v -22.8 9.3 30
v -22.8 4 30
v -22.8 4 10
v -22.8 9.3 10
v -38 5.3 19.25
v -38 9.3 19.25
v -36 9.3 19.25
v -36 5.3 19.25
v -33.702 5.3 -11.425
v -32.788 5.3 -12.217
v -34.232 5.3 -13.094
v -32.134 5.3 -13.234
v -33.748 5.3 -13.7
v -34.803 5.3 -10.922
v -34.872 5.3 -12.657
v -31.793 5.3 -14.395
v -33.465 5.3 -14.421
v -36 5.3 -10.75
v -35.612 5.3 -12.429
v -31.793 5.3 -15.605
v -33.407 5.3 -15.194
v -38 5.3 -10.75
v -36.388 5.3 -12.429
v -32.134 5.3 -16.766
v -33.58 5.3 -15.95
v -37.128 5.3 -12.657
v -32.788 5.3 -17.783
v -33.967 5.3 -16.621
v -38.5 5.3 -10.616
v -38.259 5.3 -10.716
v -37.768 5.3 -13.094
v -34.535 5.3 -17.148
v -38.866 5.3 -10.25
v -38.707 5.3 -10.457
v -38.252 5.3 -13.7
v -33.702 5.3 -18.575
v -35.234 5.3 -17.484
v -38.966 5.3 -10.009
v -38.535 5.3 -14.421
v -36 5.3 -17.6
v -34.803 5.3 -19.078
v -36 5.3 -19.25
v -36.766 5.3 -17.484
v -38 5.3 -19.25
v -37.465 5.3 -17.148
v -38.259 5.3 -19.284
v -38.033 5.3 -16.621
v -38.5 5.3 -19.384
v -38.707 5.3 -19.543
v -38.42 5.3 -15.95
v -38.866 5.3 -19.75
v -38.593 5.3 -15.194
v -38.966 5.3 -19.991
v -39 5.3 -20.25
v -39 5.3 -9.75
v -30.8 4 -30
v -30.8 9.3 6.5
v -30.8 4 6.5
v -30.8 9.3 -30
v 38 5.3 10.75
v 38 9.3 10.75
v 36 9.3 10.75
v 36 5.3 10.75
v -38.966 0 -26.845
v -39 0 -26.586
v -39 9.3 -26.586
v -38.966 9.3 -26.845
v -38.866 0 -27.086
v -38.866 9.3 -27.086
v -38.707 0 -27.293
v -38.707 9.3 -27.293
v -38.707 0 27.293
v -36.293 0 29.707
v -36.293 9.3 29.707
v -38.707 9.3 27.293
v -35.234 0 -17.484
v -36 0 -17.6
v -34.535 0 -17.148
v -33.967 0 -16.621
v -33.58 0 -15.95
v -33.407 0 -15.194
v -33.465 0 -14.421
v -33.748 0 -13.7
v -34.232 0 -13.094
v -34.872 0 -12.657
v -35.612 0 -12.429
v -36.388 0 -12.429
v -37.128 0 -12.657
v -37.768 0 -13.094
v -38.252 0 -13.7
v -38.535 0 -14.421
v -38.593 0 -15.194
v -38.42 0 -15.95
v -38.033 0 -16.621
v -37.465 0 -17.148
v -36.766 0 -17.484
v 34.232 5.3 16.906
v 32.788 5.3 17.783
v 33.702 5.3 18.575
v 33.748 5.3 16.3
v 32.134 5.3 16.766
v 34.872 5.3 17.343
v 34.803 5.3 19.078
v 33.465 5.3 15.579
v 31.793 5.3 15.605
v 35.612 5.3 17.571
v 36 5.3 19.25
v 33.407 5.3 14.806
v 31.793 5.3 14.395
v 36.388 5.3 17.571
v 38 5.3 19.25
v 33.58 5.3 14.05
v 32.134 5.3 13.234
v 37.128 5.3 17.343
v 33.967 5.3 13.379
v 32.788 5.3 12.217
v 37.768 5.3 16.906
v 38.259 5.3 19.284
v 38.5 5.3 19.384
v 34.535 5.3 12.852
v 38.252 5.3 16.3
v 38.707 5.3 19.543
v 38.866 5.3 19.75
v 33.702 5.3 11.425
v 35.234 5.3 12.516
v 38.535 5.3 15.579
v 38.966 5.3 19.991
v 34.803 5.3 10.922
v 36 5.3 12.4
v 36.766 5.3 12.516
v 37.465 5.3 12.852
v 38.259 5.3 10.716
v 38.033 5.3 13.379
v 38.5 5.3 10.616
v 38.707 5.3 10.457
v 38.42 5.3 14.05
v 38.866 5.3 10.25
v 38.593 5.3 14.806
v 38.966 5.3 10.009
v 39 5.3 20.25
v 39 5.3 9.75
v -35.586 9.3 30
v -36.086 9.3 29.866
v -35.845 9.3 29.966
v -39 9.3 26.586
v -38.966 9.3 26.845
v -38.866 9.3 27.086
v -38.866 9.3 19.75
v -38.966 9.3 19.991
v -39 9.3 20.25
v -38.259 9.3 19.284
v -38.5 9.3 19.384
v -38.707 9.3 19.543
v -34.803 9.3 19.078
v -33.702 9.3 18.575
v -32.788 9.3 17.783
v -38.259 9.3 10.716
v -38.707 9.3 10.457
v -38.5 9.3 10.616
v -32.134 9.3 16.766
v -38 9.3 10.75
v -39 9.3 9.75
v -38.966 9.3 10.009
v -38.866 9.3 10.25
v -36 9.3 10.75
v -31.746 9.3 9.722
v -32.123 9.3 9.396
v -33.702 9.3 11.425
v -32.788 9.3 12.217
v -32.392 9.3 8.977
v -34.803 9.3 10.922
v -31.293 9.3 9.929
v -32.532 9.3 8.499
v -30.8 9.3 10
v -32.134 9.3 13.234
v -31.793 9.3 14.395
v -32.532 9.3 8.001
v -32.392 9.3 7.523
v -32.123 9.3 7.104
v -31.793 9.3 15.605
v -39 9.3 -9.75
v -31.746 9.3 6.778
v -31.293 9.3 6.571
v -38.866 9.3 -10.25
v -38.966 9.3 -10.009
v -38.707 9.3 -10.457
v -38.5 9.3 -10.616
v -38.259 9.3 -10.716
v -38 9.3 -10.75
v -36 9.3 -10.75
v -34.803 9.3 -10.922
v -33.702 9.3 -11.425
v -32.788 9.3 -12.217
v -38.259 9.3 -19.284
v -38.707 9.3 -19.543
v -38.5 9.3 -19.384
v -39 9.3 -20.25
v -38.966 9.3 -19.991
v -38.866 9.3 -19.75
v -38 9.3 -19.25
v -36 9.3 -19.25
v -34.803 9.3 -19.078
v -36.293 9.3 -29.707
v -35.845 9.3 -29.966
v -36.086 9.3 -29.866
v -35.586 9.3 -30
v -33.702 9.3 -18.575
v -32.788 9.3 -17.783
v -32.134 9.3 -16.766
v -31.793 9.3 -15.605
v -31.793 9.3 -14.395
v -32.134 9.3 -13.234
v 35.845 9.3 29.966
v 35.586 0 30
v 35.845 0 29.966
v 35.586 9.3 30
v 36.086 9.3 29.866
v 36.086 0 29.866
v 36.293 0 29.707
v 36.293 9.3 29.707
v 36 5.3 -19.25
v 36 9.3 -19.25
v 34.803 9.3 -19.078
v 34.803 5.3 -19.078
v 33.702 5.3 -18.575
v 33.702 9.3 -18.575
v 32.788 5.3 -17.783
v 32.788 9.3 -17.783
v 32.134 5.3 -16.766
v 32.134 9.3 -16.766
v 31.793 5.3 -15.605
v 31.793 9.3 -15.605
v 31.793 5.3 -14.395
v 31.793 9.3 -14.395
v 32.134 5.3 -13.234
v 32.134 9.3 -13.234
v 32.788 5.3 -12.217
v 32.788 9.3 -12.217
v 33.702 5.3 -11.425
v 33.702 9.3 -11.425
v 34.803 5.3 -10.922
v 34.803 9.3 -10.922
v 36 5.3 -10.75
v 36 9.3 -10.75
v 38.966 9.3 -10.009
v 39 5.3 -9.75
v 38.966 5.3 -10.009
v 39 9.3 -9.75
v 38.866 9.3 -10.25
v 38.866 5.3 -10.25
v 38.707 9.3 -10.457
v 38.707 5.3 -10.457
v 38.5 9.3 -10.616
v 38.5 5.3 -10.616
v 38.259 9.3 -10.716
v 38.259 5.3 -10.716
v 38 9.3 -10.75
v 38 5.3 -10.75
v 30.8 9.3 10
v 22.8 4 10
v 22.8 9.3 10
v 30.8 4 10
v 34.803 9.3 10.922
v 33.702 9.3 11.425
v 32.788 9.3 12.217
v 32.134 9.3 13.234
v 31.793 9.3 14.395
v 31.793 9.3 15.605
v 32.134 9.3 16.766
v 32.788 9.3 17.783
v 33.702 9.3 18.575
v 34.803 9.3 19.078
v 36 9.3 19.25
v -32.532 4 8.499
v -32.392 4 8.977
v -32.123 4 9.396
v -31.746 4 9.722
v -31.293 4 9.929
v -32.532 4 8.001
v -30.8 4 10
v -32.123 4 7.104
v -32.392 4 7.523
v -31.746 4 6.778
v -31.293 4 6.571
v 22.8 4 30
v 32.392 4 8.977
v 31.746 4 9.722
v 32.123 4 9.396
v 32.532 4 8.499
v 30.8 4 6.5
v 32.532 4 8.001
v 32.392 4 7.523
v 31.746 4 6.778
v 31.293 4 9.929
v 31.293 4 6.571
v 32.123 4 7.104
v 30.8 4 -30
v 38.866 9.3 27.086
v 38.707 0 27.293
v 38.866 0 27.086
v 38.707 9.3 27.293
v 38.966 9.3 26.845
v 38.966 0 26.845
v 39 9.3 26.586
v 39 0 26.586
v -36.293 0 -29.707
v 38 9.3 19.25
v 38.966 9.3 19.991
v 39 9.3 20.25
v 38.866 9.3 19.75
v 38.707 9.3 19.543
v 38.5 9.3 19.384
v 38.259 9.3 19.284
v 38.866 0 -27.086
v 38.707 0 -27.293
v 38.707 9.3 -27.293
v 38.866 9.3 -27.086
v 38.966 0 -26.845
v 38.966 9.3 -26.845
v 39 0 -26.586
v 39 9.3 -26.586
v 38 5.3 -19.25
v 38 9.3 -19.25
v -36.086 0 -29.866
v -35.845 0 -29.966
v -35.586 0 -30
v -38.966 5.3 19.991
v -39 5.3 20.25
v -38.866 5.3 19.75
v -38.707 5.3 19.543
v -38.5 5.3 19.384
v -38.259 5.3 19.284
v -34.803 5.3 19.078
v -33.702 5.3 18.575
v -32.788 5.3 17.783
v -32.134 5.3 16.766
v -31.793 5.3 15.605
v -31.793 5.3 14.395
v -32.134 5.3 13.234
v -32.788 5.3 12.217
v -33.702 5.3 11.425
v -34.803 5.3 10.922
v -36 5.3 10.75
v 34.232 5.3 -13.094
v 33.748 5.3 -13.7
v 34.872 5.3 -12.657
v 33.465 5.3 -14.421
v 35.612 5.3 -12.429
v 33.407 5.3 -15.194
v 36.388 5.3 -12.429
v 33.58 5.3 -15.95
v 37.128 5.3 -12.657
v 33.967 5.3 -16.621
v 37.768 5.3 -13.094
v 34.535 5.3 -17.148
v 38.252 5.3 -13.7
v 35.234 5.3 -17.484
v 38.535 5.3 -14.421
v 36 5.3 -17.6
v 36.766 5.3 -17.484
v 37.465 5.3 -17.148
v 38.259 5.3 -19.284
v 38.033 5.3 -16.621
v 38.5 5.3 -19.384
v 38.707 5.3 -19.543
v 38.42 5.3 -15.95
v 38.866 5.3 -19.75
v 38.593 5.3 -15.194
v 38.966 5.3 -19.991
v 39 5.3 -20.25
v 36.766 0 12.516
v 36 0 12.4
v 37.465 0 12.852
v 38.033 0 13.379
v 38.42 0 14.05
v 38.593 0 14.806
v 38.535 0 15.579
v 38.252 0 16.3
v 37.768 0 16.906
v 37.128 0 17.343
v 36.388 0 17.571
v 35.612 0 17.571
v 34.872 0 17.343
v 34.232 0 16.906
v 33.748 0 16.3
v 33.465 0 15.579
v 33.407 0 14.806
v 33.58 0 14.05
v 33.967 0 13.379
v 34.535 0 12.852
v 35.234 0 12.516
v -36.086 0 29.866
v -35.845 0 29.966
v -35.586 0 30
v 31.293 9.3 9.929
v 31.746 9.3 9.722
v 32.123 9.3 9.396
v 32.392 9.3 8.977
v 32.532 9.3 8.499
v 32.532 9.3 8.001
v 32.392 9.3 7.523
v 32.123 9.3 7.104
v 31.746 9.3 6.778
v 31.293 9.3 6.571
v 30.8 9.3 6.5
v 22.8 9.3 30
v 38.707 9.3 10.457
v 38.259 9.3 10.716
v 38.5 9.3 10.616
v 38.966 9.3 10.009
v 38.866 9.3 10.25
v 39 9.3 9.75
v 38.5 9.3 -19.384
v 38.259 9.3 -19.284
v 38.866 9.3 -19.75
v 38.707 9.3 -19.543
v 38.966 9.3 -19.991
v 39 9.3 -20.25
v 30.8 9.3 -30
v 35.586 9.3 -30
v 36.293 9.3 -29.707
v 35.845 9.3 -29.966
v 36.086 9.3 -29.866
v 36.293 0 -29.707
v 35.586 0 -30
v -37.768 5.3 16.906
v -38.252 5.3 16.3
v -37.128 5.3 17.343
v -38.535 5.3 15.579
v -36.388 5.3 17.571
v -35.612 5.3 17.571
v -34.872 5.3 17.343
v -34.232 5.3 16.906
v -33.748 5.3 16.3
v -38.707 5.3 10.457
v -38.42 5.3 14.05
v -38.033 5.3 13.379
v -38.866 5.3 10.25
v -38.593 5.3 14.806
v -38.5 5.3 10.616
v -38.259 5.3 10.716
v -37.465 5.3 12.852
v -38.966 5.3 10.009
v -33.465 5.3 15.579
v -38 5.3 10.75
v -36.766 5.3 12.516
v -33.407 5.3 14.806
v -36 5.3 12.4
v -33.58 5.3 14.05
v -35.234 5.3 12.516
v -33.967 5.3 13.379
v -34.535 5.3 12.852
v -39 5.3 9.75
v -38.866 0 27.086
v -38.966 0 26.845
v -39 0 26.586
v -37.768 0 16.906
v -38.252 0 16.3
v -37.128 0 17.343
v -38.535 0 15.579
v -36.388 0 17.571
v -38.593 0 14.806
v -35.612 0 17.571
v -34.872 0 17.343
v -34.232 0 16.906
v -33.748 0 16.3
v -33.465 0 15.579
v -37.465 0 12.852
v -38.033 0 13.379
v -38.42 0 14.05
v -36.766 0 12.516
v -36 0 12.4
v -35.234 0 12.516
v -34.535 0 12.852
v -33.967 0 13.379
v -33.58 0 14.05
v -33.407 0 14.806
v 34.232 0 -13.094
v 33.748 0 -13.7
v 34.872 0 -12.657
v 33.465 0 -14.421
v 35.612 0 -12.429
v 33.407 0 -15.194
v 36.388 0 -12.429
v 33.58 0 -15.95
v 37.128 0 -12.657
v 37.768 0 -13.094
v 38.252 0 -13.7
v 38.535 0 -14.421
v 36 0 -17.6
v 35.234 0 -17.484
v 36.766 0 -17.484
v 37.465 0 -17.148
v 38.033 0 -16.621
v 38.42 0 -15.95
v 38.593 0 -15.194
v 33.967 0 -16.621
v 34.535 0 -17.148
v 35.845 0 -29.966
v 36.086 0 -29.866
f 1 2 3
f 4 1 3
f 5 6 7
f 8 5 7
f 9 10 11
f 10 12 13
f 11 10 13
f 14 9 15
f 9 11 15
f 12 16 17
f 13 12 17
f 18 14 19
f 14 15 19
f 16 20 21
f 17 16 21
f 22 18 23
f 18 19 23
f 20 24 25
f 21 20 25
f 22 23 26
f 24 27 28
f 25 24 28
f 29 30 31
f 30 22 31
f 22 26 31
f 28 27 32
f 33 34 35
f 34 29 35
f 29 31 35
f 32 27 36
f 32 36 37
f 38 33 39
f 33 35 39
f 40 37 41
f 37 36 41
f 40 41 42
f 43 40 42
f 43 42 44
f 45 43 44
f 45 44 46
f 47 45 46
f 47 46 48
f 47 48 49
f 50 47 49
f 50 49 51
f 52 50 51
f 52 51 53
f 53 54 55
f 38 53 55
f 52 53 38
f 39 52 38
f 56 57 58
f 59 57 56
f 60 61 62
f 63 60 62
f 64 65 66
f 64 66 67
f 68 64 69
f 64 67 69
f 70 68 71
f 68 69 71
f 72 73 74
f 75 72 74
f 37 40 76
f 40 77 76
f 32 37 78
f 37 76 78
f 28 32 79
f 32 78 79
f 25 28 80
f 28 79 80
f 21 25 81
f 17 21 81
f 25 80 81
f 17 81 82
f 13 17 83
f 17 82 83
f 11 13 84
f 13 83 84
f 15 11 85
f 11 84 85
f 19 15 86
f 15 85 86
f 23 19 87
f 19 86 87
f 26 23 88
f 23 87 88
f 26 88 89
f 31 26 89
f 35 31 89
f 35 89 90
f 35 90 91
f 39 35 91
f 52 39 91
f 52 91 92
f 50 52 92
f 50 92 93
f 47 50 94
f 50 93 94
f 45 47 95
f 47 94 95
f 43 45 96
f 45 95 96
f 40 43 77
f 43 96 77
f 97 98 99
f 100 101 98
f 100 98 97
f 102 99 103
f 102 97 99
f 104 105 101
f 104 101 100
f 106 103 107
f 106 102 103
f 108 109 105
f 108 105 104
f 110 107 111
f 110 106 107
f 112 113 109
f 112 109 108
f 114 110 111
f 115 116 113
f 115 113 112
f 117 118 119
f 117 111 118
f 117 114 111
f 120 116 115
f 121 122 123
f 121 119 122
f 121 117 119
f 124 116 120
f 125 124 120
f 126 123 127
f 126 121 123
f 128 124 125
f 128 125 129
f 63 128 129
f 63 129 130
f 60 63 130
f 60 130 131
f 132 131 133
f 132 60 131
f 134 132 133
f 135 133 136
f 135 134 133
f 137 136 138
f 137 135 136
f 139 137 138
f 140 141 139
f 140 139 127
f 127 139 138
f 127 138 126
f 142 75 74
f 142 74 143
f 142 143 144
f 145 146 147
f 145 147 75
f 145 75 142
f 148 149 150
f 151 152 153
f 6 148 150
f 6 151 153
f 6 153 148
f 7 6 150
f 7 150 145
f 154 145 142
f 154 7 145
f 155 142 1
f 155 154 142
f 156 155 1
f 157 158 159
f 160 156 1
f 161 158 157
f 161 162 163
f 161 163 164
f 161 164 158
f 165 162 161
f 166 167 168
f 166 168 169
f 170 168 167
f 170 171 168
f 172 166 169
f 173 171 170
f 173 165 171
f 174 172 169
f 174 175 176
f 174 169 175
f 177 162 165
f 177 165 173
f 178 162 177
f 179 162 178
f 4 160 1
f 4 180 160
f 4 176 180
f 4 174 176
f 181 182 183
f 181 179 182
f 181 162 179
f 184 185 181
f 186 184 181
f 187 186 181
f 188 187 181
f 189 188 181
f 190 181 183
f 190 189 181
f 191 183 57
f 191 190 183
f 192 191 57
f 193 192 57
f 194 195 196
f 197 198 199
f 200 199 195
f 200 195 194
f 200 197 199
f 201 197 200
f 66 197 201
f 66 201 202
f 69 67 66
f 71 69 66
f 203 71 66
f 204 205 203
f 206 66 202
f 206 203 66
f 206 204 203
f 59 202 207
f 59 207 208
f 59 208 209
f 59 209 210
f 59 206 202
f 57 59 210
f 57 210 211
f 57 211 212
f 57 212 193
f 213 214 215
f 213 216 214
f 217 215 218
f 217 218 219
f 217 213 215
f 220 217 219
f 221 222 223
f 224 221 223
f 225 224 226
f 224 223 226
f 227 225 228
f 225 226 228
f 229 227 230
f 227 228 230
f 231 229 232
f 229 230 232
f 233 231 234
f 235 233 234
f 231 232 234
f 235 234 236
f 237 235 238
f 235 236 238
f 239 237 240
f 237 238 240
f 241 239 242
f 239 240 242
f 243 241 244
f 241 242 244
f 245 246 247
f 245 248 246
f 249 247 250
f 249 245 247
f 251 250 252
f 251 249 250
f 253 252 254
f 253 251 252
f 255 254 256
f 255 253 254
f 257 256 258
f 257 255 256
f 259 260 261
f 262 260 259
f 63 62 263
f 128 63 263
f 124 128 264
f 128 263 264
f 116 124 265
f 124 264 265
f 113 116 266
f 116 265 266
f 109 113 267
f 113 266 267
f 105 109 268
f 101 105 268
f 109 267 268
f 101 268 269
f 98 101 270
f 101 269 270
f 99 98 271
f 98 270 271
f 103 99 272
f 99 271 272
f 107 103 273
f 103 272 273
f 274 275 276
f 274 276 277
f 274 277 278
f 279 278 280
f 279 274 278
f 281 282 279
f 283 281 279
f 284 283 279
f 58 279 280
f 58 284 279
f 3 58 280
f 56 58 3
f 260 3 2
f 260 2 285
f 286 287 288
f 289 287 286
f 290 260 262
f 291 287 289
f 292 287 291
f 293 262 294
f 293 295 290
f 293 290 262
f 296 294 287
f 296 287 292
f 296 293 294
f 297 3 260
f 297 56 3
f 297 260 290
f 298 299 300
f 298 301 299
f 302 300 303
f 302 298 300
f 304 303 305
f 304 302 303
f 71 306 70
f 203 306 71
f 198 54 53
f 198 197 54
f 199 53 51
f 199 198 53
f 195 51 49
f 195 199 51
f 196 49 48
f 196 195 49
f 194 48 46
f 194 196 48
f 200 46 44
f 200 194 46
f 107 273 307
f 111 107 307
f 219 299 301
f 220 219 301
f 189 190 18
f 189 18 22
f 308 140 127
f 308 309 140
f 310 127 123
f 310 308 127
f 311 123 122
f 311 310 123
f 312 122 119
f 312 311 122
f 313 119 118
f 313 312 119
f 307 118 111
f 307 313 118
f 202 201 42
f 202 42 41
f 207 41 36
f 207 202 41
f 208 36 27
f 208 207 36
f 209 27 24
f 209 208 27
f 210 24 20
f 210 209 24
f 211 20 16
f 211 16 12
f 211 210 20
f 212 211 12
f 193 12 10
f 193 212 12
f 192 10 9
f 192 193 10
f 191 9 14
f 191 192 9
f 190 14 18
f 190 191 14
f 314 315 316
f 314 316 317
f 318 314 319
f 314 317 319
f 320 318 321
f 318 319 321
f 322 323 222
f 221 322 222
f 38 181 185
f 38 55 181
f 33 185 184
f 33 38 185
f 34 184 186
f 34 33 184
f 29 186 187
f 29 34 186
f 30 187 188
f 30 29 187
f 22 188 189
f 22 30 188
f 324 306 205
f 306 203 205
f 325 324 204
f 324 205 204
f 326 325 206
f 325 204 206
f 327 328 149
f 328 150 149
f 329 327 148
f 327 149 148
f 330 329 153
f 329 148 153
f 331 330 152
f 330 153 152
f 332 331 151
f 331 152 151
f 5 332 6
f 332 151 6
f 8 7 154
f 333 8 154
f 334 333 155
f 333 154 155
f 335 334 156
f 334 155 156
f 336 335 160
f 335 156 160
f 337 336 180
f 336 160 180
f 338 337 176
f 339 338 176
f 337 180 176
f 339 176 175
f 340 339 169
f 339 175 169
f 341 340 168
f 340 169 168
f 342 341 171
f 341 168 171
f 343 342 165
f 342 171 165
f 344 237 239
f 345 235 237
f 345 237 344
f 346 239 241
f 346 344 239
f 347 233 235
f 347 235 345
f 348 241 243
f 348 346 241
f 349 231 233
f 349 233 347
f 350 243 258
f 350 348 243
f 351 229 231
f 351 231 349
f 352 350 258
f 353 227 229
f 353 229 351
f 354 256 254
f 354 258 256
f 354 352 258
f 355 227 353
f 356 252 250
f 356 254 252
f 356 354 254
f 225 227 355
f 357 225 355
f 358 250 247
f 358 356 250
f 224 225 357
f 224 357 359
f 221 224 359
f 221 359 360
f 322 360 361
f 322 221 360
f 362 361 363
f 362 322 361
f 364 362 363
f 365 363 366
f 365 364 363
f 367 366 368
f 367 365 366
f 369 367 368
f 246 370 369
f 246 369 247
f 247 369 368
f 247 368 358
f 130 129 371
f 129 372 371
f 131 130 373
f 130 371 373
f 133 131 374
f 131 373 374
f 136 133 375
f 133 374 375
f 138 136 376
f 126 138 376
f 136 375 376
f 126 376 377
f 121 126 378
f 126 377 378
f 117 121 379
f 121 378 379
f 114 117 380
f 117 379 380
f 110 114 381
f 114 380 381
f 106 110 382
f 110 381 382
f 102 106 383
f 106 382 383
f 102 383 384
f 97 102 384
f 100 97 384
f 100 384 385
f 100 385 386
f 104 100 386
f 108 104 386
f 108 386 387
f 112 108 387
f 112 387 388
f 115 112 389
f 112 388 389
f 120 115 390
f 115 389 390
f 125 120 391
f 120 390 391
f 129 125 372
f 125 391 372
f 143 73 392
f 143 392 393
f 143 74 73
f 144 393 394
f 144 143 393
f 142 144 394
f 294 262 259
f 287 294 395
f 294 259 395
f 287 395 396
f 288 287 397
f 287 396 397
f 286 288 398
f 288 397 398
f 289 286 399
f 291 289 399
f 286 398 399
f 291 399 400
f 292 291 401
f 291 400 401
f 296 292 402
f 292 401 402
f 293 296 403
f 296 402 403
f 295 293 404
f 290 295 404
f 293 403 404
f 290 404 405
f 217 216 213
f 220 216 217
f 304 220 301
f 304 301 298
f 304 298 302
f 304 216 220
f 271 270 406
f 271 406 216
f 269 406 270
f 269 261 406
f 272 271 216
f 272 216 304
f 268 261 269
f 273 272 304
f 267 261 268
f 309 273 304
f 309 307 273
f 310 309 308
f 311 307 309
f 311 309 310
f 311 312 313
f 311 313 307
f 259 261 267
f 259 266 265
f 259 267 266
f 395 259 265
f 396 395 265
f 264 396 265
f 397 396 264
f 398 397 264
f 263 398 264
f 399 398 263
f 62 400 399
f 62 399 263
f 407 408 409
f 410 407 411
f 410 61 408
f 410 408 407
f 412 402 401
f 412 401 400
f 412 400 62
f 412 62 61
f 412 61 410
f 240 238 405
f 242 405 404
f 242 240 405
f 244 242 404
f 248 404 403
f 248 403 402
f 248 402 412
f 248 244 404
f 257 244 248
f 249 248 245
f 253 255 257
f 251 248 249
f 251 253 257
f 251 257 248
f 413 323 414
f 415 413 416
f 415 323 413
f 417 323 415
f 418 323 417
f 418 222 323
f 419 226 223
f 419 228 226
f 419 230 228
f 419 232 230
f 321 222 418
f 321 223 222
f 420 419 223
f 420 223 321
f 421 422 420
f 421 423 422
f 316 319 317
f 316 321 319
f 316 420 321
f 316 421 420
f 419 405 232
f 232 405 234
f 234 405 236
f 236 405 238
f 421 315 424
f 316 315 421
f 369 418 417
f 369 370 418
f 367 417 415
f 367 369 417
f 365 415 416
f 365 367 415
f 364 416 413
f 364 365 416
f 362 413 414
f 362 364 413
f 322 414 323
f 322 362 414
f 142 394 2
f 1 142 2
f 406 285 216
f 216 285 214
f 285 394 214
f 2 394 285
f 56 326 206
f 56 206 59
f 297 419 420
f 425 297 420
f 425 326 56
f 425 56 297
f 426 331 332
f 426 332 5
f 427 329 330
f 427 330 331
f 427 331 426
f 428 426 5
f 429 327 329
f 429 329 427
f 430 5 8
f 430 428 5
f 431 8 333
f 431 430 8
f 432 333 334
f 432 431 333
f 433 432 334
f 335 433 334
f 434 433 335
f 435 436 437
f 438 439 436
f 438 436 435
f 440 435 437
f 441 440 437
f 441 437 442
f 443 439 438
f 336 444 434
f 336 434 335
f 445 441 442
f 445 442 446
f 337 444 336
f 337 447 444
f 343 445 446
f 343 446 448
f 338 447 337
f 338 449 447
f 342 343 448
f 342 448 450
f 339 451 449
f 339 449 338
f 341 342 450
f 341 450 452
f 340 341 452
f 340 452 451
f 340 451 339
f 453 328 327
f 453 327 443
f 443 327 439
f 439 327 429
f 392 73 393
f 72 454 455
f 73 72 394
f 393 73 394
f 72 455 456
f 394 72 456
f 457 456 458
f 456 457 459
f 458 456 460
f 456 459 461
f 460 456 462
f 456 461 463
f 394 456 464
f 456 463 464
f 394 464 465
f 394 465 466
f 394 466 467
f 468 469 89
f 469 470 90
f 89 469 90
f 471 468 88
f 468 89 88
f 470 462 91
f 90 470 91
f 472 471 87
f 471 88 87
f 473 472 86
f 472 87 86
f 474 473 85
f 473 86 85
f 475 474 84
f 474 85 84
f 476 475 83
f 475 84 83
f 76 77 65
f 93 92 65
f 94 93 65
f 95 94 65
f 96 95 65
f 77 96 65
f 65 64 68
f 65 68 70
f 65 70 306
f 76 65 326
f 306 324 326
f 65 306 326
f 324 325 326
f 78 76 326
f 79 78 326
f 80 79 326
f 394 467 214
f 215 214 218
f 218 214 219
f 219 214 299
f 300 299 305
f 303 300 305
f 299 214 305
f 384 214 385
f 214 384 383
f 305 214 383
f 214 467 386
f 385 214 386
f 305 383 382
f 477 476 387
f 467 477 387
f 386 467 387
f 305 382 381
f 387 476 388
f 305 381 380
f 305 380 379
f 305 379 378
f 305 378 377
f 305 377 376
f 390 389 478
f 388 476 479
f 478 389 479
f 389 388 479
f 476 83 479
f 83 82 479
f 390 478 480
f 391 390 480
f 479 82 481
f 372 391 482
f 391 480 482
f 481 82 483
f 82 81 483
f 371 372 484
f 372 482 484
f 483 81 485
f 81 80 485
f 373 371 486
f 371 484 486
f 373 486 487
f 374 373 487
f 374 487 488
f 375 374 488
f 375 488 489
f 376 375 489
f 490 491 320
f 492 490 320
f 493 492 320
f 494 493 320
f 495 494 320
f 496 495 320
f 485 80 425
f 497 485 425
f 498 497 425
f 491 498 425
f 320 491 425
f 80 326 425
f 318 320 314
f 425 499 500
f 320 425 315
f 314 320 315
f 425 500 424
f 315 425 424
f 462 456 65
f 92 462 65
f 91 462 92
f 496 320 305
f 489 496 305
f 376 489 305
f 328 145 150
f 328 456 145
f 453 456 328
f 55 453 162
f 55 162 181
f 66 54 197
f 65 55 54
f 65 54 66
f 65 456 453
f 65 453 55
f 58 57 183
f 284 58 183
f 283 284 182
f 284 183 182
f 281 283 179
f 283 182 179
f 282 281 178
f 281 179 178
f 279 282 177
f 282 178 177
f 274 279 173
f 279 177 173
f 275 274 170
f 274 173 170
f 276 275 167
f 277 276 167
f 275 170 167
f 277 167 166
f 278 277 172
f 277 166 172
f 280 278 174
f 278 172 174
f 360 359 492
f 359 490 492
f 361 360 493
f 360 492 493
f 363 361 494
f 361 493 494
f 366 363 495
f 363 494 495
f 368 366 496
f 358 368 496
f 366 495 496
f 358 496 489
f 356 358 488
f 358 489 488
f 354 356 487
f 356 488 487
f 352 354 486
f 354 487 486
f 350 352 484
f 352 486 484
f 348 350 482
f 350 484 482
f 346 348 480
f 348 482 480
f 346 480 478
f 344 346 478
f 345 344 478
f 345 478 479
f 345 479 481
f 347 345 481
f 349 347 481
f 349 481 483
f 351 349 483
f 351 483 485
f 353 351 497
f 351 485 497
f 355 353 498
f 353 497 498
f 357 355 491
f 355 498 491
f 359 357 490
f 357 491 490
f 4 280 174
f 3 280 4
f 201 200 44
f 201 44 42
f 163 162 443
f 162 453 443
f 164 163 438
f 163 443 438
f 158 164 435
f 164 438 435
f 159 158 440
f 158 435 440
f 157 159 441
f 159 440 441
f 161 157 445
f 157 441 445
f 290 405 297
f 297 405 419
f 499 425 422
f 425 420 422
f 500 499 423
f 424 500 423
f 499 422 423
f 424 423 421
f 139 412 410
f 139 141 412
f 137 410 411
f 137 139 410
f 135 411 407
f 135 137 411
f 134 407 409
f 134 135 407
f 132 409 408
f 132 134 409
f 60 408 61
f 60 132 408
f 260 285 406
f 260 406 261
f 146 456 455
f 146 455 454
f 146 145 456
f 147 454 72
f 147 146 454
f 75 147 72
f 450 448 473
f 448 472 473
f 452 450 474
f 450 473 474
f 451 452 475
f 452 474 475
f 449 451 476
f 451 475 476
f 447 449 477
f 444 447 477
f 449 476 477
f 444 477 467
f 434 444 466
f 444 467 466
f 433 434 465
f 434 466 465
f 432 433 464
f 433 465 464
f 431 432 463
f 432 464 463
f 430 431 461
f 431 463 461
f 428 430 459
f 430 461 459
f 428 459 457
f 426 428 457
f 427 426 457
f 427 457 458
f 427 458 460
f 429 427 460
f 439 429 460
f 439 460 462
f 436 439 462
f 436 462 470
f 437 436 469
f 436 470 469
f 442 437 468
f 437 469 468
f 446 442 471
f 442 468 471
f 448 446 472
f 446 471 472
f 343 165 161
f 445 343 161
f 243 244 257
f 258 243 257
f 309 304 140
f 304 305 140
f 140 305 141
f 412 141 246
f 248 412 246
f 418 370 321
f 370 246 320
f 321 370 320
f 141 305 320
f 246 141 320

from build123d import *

# Parameters (mm, degrees)
SKETCH1_W                         = 78
SKETCH1_H                         = 60
BOSS_EXTRUDE1_DEPTH               = 9.3
TAP_DRILL_FOR_M5_TAP1_D           = 5.2
TAP_DRILL_FOR_M5_TAP1_DEPTH       = 46
TAP_DRILL_FOR_M5_TAP1_CSINK_D     = 6
TAP_DRILL_FOR_M5_TAP1_CSINK_ANGLE = 90
TAP_DRILL_FOR_M5_TAP1_TIP         = 1.562237609
SKETCH4_W                         = 61.6
SKETCH4_H                         = 60
CUT_EXTRUDE1_DEPTH                = 5.3
CHAMFER1_SIZE                     = 3
CUT_EXTRUDE2_DEPTH                = 4
FILLET1_R                         = 1
FILLET2_R                         = 1
SKETCH7_W                         = 8
SKETCH7_H                         = 20
BOSS_EXTRUDE2_DEPTH               = 5.3
SKETCH8_R                         = 1.75
CUT_EXTRUDE3_DEPTH                = 5.3


with BuildPart() as part:
    # Sketch1 → Boss-Extrude1 (new body)
    with BuildSketch(Plane(origin=(0, 0, 0), x_dir=(1, 0, 0), z_dir=(0, 1, 0))):
        Rectangle(SKETCH1_W, SKETCH1_H)
    extrude(amount=BOSS_EXTRUDE1_DEPTH)

    # Tap Drill for M5 Tap1
    with Locations(Plane(origin=(-36, 9.3, -15), x_dir=(0, 0, 1), z_dir=(0, 1, 0))):
        with Locations((0, 0), (30, 0), (30, 72), (0, 72)):
            CounterSinkHole(TAP_DRILL_FOR_M5_TAP1_D / 2, TAP_DRILL_FOR_M5_TAP1_CSINK_D / 2, depth=TAP_DRILL_FOR_M5_TAP1_DEPTH, counter_sink_angle=TAP_DRILL_FOR_M5_TAP1_CSINK_ANGLE)
            with Locations((0, 0, -(TAP_DRILL_FOR_M5_TAP1_DEPTH + TAP_DRILL_FOR_M5_TAP1_TIP / 2))):  # 118° drill point
                Cone(0, TAP_DRILL_FOR_M5_TAP1_D / 2, TAP_DRILL_FOR_M5_TAP1_TIP, mode=Mode.SUBTRACT)

    # Sketch4 → Cut-Extrude1 (cut)
    with BuildSketch(Plane(origin=(0, 9.3, 0), x_dir=(1, 0, 0), z_dir=(0, 1, 0))):
        Rectangle(SKETCH4_W, SKETCH4_H)
    extrude(amount=-CUT_EXTRUDE1_DEPTH, mode=Mode.SUBTRACT)

    # Chamfer1
    chamfer1_edges = [part.edges().sort_by_distance(p)[0] for p in [
        (39, 4.65, 30),
        (-39, 4.65, 30),
        (-39, 4.65, -30),
        (39, 4.65, -30),
    ]]
    chamfer(chamfer1_edges, length=CHAMFER1_SIZE)

    # Sketch6 → Cut-Extrude2 (cut)
    with BuildSketch(Plane(origin=(0, 9.3, 0), x_dir=(1, 0, 0), z_dir=(0, 1, 0))):
        with BuildLine():
            Line((-39.66, 19.25), (-36, 19.25))
            ThreePointArc((-36, 19.25), (-31.75, 15), (-36, 10.75))
            Line((-36, 10.75), (-39.66, 10.75))
            ThreePointArc((-39.66, 10.75), (-43.91, 15), (-39.66, 19.25))
        make_face()
        with BuildLine():
            Line((-39.66, -19.25), (-36, -19.25))
            ThreePointArc((-36, -19.25), (-31.75, -15), (-36, -10.75))
            Line((-36, -10.75), (-39.66, -10.75))
            ThreePointArc((-39.66, -10.75), (-43.91, -15), (-39.66, -19.25))
        make_face()
        with BuildLine():
            Line((39.66, 19.25), (36, 19.25))
            ThreePointArc((36, 19.25), (31.75, 15), (36, 10.75))
            Line((36, 10.75), (39.66, 10.75))
            ThreePointArc((39.66, 10.75), (43.91, 15), (39.66, 19.25))
        make_face()
        with BuildLine():
            Line((39.66, -10.75), (36, -10.75))
            ThreePointArc((36, -10.75), (31.75, -15), (36, -19.25))
            Line((36, -19.25), (39.66, -19.25))
            ThreePointArc((39.66, -19.25), (43.91, -15), (39.66, -10.75))
        make_face()
    extrude(amount=-CUT_EXTRUDE2_DEPTH, mode=Mode.SUBTRACT)

    # Fillet1
    fillet1_edges = [part.edges().sort_by_distance(p)[0] for p in [
        (-39, 4.65, 27),
        (-39, 4.65, -27),
        (36, 4.65, -30),
        (-36, 4.65, -30),
        (39, 4.65, 27),
        (39, 4.65, -27),
        (-36, 4.65, 30),
        (36, 4.65, 30),
    ]]
    fillet(fillet1_edges, radius=FILLET1_R)

    # Fillet2
    fillet2_edges = [part.edges().sort_by_distance(p)[0] for p in [
        (39, 7.3, -10.75),
        (39, 7.3, -19.25),
        (39, 7.3, 19.25),
        (39, 7.3, 10.75),
        (-39, 7.3, -19.25),
        (-39, 7.3, -10.75),
        (-39, 7.3, 19.25),
        (-39, 7.3, 10.75),
    ]]
    fillet(fillet2_edges, radius=FILLET2_R)

    # Sketch7 → Boss-Extrude2 (add)
    with BuildSketch(Plane(origin=(0, 4, 0), x_dir=(1, 0, 0), z_dir=(0, 1, 0))):
        with Locations((-26.8, -20)):
            Rectangle(SKETCH7_W, SKETCH7_H)
        with Locations((26.8, -20)):
            Rectangle(SKETCH7_W, SKETCH7_H)
    extrude(amount=BOSS_EXTRUDE2_DEPTH)

    # Sketch8 → Cut-Extrude3 (cut)
    with BuildSketch(Plane(origin=(0, 9.3, 0), x_dir=(1, 0, 0), z_dir=(0, 1, 0))):
        with Locations((30.8, -8.25)):
            Circle(SKETCH8_R)
        with Locations((-30.8, -8.25)):
            Circle(SKETCH8_R)
    extrude(amount=-CUT_EXTRUDE3_DEPTH, mode=Mode.SUBTRACT)


solid = part.part
